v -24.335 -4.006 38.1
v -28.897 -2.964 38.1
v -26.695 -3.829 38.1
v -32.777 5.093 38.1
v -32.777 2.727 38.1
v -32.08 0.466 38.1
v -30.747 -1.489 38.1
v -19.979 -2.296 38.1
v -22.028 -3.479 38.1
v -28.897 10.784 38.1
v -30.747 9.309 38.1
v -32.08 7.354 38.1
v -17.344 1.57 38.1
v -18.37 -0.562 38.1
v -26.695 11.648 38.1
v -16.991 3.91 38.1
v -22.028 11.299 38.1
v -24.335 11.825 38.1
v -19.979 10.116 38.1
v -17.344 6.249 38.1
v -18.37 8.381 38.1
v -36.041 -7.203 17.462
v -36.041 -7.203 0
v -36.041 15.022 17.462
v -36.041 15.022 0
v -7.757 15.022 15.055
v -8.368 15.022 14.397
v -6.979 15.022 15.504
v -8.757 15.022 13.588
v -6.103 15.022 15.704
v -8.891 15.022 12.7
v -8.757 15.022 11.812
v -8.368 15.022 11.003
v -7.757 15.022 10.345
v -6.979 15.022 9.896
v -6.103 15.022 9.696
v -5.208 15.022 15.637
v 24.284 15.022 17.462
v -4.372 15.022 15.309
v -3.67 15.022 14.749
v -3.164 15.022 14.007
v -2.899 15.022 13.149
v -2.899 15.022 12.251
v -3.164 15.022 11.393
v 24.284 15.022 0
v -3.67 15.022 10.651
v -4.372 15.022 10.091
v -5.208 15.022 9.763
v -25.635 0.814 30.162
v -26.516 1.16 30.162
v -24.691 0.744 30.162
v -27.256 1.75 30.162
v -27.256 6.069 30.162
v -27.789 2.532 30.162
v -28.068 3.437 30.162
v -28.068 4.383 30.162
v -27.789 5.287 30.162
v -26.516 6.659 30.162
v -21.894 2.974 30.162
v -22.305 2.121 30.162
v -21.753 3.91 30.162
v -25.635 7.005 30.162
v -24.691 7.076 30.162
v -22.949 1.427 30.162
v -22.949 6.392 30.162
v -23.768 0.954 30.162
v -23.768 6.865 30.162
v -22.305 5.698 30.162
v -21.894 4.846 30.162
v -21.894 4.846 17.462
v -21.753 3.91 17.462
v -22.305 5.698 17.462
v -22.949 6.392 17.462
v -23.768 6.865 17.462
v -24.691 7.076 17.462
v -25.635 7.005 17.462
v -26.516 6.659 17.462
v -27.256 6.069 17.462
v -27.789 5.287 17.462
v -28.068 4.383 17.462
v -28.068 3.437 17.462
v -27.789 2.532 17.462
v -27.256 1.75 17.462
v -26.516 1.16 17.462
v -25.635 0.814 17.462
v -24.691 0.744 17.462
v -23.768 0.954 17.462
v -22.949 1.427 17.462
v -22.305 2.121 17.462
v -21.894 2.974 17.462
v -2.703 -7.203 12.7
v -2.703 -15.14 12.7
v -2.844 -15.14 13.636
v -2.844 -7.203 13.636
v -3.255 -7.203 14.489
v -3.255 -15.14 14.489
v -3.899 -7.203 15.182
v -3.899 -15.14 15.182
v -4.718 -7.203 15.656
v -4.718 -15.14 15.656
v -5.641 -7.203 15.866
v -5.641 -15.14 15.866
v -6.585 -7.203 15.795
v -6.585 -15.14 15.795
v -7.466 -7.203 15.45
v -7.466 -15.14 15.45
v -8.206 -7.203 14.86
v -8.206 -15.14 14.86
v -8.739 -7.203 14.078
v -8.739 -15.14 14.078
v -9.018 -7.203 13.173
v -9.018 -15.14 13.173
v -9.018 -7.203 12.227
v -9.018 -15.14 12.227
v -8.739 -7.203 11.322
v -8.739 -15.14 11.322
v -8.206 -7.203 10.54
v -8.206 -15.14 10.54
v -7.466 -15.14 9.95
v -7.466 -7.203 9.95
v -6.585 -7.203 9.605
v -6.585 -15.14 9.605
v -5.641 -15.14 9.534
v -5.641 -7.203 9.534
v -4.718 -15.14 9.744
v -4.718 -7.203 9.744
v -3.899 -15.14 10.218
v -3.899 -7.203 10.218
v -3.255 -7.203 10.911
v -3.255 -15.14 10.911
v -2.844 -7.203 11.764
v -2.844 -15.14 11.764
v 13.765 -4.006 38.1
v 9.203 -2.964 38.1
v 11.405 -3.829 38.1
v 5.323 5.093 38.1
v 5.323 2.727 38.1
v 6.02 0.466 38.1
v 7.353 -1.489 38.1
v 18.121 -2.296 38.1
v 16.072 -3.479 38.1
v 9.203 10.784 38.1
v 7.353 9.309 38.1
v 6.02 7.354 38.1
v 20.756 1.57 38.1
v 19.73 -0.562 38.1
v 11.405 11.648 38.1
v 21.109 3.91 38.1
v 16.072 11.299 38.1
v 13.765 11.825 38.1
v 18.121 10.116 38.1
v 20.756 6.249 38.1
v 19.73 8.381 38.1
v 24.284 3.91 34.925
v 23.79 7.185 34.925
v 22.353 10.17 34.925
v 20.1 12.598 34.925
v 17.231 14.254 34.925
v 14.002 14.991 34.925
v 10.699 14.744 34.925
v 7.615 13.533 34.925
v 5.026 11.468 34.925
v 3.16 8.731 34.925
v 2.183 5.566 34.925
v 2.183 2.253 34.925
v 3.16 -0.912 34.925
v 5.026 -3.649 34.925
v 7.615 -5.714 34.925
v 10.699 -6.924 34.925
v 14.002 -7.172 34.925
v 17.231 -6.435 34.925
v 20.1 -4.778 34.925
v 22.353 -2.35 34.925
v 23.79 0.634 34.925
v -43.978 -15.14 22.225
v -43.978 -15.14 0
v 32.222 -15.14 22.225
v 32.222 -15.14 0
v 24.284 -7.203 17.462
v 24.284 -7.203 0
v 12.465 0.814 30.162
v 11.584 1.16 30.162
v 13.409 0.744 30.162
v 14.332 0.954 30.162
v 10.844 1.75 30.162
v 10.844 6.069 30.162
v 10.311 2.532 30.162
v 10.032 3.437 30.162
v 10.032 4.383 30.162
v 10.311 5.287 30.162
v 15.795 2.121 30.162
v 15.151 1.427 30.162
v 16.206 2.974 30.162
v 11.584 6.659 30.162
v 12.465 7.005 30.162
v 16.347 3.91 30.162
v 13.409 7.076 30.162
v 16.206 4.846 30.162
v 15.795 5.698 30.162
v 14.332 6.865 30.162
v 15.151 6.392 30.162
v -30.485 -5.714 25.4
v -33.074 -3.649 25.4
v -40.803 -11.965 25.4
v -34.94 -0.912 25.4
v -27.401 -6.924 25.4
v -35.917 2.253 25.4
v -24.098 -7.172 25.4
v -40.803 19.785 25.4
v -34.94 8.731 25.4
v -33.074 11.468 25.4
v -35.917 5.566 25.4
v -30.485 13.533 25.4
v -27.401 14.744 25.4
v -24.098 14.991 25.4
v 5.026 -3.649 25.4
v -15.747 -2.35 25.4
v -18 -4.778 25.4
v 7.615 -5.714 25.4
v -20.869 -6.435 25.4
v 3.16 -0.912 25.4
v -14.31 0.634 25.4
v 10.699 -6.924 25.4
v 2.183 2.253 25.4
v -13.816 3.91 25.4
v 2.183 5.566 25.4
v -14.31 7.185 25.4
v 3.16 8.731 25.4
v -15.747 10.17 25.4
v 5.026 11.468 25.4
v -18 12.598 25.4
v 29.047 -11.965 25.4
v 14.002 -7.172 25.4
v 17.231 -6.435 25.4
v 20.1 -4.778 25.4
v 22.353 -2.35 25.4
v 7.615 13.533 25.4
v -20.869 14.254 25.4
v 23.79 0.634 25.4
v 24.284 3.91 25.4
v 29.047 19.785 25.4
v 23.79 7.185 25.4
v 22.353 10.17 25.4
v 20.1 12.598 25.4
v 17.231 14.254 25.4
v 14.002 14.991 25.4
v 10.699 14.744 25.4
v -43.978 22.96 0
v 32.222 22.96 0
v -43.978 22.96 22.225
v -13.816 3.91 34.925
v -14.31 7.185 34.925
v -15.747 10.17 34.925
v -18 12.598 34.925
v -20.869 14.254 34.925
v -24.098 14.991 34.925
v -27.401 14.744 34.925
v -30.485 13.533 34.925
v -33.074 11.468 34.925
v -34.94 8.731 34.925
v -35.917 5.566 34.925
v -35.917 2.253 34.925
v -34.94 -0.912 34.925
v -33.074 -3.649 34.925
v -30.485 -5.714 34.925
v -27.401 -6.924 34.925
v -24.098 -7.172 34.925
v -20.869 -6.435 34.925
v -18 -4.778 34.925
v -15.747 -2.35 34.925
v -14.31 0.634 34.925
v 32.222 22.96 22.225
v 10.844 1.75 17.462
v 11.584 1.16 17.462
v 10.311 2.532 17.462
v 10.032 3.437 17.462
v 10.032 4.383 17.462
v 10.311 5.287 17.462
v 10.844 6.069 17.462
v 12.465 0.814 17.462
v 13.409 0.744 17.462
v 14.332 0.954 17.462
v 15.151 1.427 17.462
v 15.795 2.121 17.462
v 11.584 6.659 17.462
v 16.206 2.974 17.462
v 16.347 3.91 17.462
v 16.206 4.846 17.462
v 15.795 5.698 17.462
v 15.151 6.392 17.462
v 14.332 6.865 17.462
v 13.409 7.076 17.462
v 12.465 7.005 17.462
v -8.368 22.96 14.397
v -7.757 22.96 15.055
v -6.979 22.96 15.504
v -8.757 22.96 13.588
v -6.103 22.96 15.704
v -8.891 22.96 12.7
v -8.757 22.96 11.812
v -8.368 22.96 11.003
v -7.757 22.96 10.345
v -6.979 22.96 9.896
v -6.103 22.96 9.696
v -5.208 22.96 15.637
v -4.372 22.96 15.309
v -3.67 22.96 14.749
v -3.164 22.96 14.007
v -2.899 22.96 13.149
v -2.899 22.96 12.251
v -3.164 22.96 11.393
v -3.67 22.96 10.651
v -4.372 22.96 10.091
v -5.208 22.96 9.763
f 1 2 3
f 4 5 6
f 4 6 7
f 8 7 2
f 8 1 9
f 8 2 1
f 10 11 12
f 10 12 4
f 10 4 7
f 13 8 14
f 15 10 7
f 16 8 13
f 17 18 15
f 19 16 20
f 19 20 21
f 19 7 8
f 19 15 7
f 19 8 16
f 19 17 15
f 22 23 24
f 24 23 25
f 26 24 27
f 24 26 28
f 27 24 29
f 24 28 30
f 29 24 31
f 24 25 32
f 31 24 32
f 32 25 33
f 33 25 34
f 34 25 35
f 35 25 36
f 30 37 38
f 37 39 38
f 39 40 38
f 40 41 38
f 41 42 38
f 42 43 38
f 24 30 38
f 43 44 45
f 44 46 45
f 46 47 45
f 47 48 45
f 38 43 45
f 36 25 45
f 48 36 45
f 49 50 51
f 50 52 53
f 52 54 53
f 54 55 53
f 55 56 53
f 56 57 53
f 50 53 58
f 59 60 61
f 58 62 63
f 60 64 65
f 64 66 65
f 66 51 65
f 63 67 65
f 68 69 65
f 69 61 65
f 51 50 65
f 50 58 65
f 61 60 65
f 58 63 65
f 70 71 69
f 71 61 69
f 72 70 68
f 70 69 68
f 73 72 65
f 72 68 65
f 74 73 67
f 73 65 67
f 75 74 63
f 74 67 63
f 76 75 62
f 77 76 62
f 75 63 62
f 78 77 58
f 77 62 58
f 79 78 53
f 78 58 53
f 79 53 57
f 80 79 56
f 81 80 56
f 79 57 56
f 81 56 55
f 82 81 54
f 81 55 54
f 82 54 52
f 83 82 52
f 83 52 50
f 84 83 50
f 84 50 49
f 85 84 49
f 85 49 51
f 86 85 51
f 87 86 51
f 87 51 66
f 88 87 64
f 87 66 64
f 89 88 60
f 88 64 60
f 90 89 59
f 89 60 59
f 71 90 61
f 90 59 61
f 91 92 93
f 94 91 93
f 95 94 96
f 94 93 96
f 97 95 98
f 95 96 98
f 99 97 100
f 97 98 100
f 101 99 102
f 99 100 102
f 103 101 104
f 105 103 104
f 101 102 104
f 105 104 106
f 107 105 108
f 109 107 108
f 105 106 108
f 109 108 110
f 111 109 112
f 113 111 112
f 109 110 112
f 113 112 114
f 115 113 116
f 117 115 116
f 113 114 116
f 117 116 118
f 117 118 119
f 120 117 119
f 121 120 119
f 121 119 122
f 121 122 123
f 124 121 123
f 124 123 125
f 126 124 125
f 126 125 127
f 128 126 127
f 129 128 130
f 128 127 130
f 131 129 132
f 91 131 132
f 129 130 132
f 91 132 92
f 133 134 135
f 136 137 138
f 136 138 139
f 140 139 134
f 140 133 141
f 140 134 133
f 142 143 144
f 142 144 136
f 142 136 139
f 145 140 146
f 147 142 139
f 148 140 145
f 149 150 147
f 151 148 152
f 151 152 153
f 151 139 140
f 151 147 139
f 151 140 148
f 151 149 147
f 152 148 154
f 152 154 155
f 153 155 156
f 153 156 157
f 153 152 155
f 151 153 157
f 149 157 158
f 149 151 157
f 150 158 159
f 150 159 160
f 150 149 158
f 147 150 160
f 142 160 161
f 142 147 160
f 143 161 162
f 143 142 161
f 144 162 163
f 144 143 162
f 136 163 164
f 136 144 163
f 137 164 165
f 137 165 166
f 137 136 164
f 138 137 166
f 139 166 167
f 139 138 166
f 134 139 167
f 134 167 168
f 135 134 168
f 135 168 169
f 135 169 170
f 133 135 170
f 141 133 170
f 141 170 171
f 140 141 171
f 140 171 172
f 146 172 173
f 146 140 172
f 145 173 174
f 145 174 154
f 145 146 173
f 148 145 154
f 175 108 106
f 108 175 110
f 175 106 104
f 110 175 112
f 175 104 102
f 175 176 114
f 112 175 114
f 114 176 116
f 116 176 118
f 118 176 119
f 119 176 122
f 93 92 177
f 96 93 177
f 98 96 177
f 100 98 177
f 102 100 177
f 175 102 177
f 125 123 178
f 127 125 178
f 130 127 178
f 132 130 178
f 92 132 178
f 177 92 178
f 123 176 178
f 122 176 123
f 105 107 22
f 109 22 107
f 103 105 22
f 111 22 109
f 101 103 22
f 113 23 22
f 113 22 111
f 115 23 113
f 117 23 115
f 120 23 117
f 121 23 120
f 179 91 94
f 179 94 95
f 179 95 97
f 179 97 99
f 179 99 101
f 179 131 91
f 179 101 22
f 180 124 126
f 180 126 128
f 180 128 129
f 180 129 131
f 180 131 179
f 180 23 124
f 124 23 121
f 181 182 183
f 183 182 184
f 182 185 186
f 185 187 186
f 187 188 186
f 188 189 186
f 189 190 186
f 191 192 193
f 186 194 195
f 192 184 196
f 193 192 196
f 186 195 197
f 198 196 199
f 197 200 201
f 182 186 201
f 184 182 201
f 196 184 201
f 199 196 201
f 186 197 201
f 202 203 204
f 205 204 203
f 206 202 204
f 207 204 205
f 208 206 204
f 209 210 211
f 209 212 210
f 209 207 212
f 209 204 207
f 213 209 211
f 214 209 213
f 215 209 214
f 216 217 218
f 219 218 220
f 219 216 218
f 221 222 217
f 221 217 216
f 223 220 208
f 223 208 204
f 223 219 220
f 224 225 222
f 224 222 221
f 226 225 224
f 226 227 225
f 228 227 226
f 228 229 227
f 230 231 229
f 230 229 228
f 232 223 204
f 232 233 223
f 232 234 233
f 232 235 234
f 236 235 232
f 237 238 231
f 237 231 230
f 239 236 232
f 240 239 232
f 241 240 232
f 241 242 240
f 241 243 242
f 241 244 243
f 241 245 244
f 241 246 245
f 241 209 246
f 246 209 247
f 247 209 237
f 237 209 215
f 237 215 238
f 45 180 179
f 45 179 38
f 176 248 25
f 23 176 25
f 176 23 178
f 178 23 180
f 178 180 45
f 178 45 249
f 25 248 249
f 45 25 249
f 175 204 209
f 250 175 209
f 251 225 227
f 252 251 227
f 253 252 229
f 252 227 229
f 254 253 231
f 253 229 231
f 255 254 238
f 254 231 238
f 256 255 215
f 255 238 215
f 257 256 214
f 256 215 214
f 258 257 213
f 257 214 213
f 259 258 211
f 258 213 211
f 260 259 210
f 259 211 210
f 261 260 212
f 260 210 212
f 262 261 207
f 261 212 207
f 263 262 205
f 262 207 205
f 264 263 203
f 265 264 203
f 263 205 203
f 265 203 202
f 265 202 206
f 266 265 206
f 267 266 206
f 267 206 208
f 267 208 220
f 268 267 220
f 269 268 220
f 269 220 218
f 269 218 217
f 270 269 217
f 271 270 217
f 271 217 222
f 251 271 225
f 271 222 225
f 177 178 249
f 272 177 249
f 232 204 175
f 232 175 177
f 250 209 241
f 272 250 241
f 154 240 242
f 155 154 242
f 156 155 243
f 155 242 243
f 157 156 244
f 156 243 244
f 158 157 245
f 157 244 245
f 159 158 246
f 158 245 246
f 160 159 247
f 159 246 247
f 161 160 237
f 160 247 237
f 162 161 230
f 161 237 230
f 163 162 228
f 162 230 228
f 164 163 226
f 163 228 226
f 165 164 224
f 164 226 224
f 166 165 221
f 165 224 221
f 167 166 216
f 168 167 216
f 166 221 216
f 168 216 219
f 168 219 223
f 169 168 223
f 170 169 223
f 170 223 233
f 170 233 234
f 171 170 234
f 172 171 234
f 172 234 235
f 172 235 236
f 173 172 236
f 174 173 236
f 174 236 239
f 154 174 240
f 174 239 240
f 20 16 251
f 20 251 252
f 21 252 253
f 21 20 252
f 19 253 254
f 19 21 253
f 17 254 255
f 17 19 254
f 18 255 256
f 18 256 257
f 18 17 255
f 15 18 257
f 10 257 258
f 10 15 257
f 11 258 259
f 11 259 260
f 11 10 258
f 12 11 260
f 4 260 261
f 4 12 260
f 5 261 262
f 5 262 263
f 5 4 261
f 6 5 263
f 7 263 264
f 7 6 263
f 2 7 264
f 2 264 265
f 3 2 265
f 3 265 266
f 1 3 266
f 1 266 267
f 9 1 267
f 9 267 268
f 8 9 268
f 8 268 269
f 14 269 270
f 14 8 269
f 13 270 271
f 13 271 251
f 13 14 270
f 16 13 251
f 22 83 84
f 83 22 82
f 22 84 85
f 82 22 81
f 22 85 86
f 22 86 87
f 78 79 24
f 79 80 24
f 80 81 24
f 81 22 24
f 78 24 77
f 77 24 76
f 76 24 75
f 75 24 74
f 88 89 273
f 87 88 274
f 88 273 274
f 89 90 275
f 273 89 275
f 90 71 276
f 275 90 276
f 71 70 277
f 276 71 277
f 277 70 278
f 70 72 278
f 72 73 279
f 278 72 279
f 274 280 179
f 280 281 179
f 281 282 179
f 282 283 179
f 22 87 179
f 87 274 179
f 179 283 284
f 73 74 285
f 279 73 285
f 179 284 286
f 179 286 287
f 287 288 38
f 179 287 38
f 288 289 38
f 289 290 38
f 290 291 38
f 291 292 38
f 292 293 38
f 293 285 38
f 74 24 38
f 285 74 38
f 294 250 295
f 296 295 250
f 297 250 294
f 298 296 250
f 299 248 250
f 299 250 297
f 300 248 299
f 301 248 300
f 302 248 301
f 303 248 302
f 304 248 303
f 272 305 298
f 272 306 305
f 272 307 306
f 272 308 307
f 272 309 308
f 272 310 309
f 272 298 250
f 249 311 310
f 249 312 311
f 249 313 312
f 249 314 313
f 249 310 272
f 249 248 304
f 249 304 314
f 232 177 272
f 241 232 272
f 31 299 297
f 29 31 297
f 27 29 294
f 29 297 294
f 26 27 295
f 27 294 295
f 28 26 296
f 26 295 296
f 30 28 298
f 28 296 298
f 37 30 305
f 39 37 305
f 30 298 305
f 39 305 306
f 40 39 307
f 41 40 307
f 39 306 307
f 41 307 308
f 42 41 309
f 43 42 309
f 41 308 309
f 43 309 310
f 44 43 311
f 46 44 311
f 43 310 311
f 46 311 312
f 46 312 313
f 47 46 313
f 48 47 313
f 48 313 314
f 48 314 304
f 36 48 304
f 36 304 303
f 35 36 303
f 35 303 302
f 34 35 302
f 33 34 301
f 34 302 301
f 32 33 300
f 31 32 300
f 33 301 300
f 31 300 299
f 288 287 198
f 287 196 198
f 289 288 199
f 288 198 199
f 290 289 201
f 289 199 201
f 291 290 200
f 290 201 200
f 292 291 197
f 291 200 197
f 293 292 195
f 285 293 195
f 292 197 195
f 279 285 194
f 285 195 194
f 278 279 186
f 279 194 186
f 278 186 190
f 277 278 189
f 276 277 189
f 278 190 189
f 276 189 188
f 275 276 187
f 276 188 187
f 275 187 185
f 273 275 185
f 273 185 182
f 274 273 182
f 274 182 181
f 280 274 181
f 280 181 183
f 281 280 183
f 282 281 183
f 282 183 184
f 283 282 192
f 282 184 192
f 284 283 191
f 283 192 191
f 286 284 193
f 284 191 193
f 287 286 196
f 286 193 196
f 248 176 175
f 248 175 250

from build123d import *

# Parameters (mm, degrees)
F0_W     = 76.2
F0_H     = 38.1
F1_DEPTH = 25.4
F2_R     = 11.1125
F3_DEPTH = 12.7
F4_SIZE  = 3.175
F5_T     = 7.9375
F6_R     = 3.175
F7_DEPTH = 7.9375
F8_R     = 3.0126564395
F9_DEPTH = 7.9375


# Not quite as in the source:
# - a shell that OpenCascade refuses in one call is made with other operations: the cavity is built on its own and cut out


with BuildPart() as f1:
    # F0 (on Top) → F1 (new body)
    with BuildSketch(Plane.XY):
        with Locations((-5.8783623338, 3.9097142845)):
            Rectangle(F0_W, F0_H)
    extrude(amount=F1_DEPTH)

    # F2 (on face) → F3 (join)
    with BuildSketch(Plane.XY.offset(25.4)):
        with Locations((-24.9283623338, 3.9097142845)):
            Circle(F2_R)
        with Locations((13.1716376662, 3.9097142845)):
            Circle(F2_R)
    extrude(amount=F3_DEPTH)

    # F4
    f4_edges = [f1.edges().sort_by_distance(p)[0] for p in [
        (-36.040862, 3.909714, 38.1),
        (2.059138, 3.909714, 38.1),
        (32.221638, 3.909714, 25.4),
        (-5.878362, 22.959714, 25.4),
        (-43.978362, 3.909714, 25.4),
        (-5.878362, -15.140286, 25.4),
    ]]
    chamfer(f4_edges, length=F4_SIZE)

    # F5: shell of thickness 7.9375, made by hand


with BuildPart() as f5_core1:
    # F5_t2: copy of F1
    add(f1.part)

    # the walls: a layer under each face that stays
    f5_faces = [f5_core1.faces().sort_by_distance(p)[0] for p in [
        (32.2216376662, 3.9097142845, 11.1125),
        (-5.8783623338, -15.1402857155, 11.1125),
        (30.6341376662, 3.9097142845, 23.8125),
        (-5.8783623338, 22.9597142845, 11.1125),
        (-43.9783623338, 3.9097142845, 11.1125),
        (-5.8783623338, -13.5527857155, 23.8125),
        (-5.8783623338, 3.9097142845, 25.4),
        (-5.8783623338, 21.3722142845, 23.8125),
        (-42.3908623338, 3.9097142845, 23.8125),
        (-36.0408623338, 3.9097142845, 30.1625),
        (2.0591376662, 3.9097142845, 30.1625),
        (-34.4533623338, 3.9097142845, 36.5125),
        (3.6466376662, 3.9097142845, 36.5125),
        (-24.9283623338, 3.9097142845, 38.1),
        (13.1716376662, 3.9097142845, 38.1),
    ]]
    thicken(f5_faces, amount=-F5_T, mode=Mode.SUBTRACT)

    # F5_s3 → F5_t4 (revolve, cut)
    with BuildSketch(Plane.XZ.offset(-3.9097142845)):
        Polygon((-13.7364873338, 25.479375), (-13.8158623338, 17.4625), (-21.7533623338, 17.4625), (-21.7533623338, 25.4), align=None)
    revolve(axis=Axis((-24.9283623338, 3.9097142845, 25.4), (0, 0, 1)), mode=Mode.SUBTRACT)

    # F5_s5 → F5_t6 (revolve, cut)
    with BuildSketch(Plane.XZ.offset(-3.9097142845)):
        Polygon((24.3635126662, 25.479375), (24.2841376662, 17.4625), (16.3466376662, 17.4625), (16.3466376662, 25.4), align=None)
    revolve(axis=Axis((13.1716376662, 3.9097142845, 25.4), (0, 0, 1)), mode=Mode.SUBTRACT)


with BuildPart() as f1_1:
    add(f1.part)

    # what is left inside the walls is the cavity
    f5_cavity = [f5_core1.part.solids().sort_by_distance(p)[0] for p in [
        (-5.878362, 0.205548, 0.079375),
    ]]
    add(f5_cavity, mode=Mode.SUBTRACT)

    # F6 (on face) → F7 (cut)
    with BuildSketch(Plane.XZ.offset(15.1402857155)):
        with Locations((-5.8783623338, 12.7)):
            Circle(F6_R)
    extrude(amount=-F7_DEPTH, mode=Mode.SUBTRACT)

    # F8 (on face) → F9 (cut)
    with BuildSketch(Plane(origin=(0, 22.9597142845, 0), x_dir=(-1, 0, 0), z_dir=(0, 1, 0))):
        with Locations((5.8783623338, 12.7)):
            Circle(F8_R)
    extrude(amount=-F9_DEPTH, mode=Mode.SUBTRACT)


solid = f1_1.part
